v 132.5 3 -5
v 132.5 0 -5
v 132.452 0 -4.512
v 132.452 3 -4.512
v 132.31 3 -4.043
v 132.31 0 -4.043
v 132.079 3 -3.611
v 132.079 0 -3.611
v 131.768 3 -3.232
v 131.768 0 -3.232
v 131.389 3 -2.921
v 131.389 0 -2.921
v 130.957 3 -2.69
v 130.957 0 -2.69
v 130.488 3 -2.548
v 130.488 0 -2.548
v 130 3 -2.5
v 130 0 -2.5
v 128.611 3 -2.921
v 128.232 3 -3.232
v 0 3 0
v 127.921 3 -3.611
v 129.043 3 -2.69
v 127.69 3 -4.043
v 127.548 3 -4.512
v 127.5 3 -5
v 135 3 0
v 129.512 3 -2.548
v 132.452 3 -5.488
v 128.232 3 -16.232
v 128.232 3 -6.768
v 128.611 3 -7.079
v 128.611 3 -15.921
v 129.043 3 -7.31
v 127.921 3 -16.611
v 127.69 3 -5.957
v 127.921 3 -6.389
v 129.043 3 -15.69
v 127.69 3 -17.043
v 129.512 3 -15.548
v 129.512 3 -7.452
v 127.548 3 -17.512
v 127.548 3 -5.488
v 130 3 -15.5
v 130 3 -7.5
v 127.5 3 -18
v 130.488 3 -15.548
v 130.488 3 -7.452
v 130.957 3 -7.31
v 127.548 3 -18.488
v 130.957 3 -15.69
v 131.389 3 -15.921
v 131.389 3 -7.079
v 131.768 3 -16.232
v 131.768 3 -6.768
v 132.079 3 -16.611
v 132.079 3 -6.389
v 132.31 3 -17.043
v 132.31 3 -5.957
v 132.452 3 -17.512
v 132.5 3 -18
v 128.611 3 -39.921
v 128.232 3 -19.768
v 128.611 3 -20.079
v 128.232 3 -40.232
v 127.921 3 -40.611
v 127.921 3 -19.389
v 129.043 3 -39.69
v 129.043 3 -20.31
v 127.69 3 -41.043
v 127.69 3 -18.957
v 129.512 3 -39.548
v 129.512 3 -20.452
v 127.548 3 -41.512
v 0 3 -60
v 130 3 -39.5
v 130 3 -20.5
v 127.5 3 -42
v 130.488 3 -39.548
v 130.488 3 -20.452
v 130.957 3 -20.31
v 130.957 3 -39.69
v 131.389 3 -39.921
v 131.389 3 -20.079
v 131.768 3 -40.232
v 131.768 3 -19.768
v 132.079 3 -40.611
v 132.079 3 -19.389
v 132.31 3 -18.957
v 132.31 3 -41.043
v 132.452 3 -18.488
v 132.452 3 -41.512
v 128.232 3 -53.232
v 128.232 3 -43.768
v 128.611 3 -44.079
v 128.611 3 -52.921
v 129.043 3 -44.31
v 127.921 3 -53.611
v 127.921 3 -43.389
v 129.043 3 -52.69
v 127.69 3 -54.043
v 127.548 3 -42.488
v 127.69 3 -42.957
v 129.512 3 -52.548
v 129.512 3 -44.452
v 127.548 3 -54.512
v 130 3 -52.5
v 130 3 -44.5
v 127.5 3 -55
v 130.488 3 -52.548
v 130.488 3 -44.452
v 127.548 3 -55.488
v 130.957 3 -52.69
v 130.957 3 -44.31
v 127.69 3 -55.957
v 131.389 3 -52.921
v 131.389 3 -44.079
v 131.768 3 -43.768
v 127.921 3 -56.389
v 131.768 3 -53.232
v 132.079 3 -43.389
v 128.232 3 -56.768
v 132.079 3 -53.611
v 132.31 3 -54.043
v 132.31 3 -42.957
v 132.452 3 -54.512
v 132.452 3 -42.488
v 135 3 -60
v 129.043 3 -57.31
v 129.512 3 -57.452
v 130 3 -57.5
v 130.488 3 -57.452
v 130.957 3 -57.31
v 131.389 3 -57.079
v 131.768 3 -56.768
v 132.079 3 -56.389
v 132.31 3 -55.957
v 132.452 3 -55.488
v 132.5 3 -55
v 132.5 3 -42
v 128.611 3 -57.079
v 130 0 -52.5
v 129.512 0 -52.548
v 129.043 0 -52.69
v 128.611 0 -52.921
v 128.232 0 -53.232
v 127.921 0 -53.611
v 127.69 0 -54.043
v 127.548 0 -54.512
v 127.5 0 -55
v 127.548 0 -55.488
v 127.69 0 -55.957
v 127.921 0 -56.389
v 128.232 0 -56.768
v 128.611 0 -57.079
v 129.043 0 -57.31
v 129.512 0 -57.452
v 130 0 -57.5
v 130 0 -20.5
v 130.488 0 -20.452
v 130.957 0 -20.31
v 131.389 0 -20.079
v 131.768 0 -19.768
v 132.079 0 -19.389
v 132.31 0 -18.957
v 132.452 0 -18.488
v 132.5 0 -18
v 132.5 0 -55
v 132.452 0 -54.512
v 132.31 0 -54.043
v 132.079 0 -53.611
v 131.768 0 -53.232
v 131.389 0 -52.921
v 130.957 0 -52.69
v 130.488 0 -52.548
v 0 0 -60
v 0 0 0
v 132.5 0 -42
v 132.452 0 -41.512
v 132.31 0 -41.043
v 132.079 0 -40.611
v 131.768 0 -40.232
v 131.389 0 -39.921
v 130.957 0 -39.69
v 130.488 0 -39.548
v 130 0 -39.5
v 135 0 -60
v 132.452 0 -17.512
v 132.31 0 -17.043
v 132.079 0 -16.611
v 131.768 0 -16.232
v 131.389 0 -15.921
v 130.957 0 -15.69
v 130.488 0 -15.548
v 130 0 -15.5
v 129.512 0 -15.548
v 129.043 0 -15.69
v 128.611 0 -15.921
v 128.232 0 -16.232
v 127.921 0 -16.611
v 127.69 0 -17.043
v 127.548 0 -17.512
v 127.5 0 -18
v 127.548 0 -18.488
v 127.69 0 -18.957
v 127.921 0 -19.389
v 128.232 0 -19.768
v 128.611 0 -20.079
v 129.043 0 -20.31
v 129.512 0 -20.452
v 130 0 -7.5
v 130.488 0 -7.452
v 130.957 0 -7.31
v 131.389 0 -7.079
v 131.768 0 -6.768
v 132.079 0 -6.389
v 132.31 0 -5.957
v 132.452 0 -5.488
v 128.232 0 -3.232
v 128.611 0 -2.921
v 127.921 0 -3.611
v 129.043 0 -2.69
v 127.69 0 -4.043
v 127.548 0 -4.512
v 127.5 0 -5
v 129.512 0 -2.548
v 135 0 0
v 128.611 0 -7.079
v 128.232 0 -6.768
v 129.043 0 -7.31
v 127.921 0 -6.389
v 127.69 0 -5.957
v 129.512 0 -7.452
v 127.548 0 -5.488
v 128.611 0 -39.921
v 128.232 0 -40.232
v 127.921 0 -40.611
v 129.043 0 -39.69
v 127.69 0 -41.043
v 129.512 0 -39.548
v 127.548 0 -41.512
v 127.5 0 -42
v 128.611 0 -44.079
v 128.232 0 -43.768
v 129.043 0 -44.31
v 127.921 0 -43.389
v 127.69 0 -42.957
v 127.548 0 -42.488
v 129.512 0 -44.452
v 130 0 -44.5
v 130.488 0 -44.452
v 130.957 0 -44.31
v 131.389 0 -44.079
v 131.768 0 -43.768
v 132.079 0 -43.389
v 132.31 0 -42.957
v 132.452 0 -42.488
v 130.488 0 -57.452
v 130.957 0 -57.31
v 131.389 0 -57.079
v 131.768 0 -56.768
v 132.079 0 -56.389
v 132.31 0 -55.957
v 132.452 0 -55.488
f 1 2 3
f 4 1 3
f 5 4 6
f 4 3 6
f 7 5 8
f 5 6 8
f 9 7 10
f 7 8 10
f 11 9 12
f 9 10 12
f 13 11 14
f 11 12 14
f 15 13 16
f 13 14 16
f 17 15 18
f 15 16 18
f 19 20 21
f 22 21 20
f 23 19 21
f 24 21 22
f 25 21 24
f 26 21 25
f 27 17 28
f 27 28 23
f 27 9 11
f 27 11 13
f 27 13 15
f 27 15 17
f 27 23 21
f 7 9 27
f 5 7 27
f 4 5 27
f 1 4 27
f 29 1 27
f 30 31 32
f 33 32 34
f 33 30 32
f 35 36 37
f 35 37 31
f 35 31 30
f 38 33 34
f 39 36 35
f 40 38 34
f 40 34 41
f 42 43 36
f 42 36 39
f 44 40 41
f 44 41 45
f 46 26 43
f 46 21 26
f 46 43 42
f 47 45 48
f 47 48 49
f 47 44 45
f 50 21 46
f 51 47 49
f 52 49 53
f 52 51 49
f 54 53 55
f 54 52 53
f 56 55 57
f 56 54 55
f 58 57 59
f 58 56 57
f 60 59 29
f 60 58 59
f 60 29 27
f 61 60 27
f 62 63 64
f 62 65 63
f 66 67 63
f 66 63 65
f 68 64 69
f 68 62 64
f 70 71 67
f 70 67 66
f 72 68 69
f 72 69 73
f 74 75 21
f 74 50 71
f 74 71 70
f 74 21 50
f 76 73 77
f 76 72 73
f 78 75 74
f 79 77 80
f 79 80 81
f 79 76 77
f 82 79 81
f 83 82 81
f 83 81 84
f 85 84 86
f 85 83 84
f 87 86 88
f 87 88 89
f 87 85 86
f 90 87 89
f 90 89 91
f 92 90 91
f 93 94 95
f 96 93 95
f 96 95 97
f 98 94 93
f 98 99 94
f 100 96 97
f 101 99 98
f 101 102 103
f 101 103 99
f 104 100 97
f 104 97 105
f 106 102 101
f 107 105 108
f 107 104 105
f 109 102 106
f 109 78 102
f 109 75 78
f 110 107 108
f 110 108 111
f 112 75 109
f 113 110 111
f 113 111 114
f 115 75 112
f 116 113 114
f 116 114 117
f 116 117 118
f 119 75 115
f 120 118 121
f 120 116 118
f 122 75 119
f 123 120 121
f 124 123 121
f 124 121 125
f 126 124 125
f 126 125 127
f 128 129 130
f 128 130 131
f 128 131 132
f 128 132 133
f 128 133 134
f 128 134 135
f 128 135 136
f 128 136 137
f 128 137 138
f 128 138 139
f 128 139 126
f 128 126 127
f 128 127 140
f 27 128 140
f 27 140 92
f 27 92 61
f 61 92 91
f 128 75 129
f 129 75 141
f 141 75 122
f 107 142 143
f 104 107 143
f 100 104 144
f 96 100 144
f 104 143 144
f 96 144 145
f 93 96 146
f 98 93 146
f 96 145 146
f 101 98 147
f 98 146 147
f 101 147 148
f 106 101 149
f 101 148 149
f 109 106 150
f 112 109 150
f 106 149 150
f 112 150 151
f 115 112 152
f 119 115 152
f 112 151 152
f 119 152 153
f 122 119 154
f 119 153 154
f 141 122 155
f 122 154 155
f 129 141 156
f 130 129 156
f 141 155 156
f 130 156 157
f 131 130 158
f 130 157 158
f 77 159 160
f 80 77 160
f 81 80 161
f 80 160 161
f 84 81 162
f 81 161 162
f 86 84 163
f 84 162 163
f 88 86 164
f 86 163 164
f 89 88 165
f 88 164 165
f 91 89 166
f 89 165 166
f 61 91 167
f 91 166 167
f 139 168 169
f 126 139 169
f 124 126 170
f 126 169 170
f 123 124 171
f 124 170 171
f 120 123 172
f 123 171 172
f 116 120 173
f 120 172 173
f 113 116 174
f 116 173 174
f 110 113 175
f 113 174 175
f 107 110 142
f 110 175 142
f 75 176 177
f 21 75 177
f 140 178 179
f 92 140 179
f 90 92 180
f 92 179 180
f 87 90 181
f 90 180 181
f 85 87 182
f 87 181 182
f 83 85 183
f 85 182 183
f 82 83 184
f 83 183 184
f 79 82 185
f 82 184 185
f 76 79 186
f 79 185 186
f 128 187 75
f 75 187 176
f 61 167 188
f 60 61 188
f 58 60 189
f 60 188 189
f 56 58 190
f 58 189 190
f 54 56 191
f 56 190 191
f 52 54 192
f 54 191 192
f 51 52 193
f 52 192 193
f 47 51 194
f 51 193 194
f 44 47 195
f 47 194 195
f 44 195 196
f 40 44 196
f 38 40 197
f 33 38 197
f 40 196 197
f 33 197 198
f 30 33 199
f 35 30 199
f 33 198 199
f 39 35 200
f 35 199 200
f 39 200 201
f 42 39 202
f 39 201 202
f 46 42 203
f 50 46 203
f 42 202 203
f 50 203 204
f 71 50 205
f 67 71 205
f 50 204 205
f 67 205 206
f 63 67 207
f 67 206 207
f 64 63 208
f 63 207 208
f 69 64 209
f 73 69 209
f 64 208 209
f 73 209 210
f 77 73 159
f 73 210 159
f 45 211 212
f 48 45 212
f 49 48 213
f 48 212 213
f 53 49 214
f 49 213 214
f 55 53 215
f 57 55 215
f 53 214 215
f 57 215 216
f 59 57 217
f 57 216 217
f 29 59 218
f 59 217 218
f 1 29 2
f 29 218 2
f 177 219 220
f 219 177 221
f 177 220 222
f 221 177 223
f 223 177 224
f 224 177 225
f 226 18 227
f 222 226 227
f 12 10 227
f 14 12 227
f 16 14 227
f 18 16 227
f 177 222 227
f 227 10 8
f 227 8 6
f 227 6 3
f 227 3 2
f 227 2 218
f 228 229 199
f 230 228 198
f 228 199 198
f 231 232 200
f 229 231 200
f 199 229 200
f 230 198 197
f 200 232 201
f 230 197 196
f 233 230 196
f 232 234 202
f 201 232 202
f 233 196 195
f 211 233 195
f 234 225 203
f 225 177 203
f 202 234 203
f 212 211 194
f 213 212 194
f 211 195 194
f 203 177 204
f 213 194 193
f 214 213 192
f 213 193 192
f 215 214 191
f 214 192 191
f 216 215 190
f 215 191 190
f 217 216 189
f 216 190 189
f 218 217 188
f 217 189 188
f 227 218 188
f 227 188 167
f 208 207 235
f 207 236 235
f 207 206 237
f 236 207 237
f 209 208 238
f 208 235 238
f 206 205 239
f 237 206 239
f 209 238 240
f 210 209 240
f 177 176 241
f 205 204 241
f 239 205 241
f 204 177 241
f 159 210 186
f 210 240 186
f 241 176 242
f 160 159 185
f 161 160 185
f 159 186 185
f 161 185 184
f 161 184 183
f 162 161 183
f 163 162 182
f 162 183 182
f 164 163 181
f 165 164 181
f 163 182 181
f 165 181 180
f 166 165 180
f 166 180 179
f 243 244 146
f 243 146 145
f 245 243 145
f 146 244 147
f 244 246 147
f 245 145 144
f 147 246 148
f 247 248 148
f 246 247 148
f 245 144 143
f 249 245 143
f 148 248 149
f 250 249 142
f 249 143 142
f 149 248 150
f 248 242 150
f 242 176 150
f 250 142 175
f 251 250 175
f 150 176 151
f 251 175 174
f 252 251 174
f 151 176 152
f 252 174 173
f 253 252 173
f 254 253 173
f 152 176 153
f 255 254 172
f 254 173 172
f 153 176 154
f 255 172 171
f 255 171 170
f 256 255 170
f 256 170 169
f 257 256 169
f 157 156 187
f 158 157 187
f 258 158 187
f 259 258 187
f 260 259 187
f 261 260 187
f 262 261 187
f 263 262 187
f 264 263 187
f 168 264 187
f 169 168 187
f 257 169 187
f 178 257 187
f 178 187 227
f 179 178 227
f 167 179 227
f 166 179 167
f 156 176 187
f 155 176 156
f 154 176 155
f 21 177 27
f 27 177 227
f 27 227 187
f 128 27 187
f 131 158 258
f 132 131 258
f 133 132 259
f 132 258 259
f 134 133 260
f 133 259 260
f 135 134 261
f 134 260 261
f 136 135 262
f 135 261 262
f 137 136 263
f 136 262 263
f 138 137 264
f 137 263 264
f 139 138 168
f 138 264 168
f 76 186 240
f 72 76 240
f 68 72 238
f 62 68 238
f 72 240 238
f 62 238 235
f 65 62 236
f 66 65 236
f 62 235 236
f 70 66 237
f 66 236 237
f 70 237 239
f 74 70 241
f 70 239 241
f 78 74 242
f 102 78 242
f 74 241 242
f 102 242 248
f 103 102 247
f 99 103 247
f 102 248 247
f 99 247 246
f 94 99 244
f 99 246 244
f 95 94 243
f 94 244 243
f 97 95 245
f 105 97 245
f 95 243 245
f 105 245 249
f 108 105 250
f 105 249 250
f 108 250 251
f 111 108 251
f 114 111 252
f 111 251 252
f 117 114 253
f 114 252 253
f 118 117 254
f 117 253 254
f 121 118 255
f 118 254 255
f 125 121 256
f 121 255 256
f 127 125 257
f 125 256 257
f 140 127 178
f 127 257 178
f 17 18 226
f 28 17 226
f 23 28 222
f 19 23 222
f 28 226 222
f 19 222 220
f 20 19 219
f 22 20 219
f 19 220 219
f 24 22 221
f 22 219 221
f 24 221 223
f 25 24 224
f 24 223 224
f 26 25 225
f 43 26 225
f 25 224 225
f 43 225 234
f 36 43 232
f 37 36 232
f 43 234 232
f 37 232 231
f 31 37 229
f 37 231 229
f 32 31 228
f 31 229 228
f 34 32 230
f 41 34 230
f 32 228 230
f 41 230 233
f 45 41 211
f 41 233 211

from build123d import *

# Parameters (mm, degrees)
BOSS_EXTRUDE1_DEPTH = 3


with BuildPart() as part:
    # Sketch1 → Boss-Extrude1 (new body)
    with BuildSketch(Plane(origin=(0, 0, 0), x_dir=(1, 0, 0), z_dir=(0, 1, 0))):
        with BuildLine():
            Line((130, 57.5), (130, 60))
            Line((130, 60), (0, 60))
            Line((0, 60), (0, 0))
            Line((0, 0), (130, 0))
            Line((130, 0), (130, 2.5))
            ThreePointArc((130, 2.5), (127.5, 5), (130, 7.5))
            Line((130, 7.5), (130, 15.5))
            ThreePointArc((130, 15.5), (127.5, 18), (130, 20.5))
            Line((130, 20.5), (130, 39.5))
            ThreePointArc((130, 39.5), (127.5, 42), (130, 44.5))
            Line((130, 44.5), (130, 52.5))
            ThreePointArc((130, 52.5), (127.5, 55), (130, 57.5))
        make_face()
        with BuildLine():
            Line((135, 60), (130, 60))
            Line((130, 60), (130, 57.5))
            ThreePointArc((130, 57.5), (131.767766953, 56.767766953), (132.5, 55))
            ThreePointArc((132.5, 55), (131.767766953, 53.232233047), (130, 52.5))
            Line((130, 52.5), (130, 44.5))
            ThreePointArc((130, 44.5), (131.767766953, 43.767766953), (132.5, 42))
            ThreePointArc((132.5, 42), (131.767766953, 40.232233047), (130, 39.5))
            Line((130, 39.5), (130, 20.5))
            ThreePointArc((130, 20.5), (131.767766953, 19.767766953), (132.5, 18))
            ThreePointArc((132.5, 18), (131.767766953, 16.232233047), (130, 15.5))
            Line((130, 15.5), (130, 7.5))
            ThreePointArc((130, 7.5), (131.767766953, 6.767766953), (132.5, 5))
            ThreePointArc((132.5, 5), (131.767766953, 3.232233047), (130, 2.5))
            Line((130, 2.5), (130, 0))
            Line((130, 0), (135, 0))
            Line((135, 0), (135, 60))
        make_face()
    extrude(amount=BOSS_EXTRUDE1_DEPTH)


solid = part.part
